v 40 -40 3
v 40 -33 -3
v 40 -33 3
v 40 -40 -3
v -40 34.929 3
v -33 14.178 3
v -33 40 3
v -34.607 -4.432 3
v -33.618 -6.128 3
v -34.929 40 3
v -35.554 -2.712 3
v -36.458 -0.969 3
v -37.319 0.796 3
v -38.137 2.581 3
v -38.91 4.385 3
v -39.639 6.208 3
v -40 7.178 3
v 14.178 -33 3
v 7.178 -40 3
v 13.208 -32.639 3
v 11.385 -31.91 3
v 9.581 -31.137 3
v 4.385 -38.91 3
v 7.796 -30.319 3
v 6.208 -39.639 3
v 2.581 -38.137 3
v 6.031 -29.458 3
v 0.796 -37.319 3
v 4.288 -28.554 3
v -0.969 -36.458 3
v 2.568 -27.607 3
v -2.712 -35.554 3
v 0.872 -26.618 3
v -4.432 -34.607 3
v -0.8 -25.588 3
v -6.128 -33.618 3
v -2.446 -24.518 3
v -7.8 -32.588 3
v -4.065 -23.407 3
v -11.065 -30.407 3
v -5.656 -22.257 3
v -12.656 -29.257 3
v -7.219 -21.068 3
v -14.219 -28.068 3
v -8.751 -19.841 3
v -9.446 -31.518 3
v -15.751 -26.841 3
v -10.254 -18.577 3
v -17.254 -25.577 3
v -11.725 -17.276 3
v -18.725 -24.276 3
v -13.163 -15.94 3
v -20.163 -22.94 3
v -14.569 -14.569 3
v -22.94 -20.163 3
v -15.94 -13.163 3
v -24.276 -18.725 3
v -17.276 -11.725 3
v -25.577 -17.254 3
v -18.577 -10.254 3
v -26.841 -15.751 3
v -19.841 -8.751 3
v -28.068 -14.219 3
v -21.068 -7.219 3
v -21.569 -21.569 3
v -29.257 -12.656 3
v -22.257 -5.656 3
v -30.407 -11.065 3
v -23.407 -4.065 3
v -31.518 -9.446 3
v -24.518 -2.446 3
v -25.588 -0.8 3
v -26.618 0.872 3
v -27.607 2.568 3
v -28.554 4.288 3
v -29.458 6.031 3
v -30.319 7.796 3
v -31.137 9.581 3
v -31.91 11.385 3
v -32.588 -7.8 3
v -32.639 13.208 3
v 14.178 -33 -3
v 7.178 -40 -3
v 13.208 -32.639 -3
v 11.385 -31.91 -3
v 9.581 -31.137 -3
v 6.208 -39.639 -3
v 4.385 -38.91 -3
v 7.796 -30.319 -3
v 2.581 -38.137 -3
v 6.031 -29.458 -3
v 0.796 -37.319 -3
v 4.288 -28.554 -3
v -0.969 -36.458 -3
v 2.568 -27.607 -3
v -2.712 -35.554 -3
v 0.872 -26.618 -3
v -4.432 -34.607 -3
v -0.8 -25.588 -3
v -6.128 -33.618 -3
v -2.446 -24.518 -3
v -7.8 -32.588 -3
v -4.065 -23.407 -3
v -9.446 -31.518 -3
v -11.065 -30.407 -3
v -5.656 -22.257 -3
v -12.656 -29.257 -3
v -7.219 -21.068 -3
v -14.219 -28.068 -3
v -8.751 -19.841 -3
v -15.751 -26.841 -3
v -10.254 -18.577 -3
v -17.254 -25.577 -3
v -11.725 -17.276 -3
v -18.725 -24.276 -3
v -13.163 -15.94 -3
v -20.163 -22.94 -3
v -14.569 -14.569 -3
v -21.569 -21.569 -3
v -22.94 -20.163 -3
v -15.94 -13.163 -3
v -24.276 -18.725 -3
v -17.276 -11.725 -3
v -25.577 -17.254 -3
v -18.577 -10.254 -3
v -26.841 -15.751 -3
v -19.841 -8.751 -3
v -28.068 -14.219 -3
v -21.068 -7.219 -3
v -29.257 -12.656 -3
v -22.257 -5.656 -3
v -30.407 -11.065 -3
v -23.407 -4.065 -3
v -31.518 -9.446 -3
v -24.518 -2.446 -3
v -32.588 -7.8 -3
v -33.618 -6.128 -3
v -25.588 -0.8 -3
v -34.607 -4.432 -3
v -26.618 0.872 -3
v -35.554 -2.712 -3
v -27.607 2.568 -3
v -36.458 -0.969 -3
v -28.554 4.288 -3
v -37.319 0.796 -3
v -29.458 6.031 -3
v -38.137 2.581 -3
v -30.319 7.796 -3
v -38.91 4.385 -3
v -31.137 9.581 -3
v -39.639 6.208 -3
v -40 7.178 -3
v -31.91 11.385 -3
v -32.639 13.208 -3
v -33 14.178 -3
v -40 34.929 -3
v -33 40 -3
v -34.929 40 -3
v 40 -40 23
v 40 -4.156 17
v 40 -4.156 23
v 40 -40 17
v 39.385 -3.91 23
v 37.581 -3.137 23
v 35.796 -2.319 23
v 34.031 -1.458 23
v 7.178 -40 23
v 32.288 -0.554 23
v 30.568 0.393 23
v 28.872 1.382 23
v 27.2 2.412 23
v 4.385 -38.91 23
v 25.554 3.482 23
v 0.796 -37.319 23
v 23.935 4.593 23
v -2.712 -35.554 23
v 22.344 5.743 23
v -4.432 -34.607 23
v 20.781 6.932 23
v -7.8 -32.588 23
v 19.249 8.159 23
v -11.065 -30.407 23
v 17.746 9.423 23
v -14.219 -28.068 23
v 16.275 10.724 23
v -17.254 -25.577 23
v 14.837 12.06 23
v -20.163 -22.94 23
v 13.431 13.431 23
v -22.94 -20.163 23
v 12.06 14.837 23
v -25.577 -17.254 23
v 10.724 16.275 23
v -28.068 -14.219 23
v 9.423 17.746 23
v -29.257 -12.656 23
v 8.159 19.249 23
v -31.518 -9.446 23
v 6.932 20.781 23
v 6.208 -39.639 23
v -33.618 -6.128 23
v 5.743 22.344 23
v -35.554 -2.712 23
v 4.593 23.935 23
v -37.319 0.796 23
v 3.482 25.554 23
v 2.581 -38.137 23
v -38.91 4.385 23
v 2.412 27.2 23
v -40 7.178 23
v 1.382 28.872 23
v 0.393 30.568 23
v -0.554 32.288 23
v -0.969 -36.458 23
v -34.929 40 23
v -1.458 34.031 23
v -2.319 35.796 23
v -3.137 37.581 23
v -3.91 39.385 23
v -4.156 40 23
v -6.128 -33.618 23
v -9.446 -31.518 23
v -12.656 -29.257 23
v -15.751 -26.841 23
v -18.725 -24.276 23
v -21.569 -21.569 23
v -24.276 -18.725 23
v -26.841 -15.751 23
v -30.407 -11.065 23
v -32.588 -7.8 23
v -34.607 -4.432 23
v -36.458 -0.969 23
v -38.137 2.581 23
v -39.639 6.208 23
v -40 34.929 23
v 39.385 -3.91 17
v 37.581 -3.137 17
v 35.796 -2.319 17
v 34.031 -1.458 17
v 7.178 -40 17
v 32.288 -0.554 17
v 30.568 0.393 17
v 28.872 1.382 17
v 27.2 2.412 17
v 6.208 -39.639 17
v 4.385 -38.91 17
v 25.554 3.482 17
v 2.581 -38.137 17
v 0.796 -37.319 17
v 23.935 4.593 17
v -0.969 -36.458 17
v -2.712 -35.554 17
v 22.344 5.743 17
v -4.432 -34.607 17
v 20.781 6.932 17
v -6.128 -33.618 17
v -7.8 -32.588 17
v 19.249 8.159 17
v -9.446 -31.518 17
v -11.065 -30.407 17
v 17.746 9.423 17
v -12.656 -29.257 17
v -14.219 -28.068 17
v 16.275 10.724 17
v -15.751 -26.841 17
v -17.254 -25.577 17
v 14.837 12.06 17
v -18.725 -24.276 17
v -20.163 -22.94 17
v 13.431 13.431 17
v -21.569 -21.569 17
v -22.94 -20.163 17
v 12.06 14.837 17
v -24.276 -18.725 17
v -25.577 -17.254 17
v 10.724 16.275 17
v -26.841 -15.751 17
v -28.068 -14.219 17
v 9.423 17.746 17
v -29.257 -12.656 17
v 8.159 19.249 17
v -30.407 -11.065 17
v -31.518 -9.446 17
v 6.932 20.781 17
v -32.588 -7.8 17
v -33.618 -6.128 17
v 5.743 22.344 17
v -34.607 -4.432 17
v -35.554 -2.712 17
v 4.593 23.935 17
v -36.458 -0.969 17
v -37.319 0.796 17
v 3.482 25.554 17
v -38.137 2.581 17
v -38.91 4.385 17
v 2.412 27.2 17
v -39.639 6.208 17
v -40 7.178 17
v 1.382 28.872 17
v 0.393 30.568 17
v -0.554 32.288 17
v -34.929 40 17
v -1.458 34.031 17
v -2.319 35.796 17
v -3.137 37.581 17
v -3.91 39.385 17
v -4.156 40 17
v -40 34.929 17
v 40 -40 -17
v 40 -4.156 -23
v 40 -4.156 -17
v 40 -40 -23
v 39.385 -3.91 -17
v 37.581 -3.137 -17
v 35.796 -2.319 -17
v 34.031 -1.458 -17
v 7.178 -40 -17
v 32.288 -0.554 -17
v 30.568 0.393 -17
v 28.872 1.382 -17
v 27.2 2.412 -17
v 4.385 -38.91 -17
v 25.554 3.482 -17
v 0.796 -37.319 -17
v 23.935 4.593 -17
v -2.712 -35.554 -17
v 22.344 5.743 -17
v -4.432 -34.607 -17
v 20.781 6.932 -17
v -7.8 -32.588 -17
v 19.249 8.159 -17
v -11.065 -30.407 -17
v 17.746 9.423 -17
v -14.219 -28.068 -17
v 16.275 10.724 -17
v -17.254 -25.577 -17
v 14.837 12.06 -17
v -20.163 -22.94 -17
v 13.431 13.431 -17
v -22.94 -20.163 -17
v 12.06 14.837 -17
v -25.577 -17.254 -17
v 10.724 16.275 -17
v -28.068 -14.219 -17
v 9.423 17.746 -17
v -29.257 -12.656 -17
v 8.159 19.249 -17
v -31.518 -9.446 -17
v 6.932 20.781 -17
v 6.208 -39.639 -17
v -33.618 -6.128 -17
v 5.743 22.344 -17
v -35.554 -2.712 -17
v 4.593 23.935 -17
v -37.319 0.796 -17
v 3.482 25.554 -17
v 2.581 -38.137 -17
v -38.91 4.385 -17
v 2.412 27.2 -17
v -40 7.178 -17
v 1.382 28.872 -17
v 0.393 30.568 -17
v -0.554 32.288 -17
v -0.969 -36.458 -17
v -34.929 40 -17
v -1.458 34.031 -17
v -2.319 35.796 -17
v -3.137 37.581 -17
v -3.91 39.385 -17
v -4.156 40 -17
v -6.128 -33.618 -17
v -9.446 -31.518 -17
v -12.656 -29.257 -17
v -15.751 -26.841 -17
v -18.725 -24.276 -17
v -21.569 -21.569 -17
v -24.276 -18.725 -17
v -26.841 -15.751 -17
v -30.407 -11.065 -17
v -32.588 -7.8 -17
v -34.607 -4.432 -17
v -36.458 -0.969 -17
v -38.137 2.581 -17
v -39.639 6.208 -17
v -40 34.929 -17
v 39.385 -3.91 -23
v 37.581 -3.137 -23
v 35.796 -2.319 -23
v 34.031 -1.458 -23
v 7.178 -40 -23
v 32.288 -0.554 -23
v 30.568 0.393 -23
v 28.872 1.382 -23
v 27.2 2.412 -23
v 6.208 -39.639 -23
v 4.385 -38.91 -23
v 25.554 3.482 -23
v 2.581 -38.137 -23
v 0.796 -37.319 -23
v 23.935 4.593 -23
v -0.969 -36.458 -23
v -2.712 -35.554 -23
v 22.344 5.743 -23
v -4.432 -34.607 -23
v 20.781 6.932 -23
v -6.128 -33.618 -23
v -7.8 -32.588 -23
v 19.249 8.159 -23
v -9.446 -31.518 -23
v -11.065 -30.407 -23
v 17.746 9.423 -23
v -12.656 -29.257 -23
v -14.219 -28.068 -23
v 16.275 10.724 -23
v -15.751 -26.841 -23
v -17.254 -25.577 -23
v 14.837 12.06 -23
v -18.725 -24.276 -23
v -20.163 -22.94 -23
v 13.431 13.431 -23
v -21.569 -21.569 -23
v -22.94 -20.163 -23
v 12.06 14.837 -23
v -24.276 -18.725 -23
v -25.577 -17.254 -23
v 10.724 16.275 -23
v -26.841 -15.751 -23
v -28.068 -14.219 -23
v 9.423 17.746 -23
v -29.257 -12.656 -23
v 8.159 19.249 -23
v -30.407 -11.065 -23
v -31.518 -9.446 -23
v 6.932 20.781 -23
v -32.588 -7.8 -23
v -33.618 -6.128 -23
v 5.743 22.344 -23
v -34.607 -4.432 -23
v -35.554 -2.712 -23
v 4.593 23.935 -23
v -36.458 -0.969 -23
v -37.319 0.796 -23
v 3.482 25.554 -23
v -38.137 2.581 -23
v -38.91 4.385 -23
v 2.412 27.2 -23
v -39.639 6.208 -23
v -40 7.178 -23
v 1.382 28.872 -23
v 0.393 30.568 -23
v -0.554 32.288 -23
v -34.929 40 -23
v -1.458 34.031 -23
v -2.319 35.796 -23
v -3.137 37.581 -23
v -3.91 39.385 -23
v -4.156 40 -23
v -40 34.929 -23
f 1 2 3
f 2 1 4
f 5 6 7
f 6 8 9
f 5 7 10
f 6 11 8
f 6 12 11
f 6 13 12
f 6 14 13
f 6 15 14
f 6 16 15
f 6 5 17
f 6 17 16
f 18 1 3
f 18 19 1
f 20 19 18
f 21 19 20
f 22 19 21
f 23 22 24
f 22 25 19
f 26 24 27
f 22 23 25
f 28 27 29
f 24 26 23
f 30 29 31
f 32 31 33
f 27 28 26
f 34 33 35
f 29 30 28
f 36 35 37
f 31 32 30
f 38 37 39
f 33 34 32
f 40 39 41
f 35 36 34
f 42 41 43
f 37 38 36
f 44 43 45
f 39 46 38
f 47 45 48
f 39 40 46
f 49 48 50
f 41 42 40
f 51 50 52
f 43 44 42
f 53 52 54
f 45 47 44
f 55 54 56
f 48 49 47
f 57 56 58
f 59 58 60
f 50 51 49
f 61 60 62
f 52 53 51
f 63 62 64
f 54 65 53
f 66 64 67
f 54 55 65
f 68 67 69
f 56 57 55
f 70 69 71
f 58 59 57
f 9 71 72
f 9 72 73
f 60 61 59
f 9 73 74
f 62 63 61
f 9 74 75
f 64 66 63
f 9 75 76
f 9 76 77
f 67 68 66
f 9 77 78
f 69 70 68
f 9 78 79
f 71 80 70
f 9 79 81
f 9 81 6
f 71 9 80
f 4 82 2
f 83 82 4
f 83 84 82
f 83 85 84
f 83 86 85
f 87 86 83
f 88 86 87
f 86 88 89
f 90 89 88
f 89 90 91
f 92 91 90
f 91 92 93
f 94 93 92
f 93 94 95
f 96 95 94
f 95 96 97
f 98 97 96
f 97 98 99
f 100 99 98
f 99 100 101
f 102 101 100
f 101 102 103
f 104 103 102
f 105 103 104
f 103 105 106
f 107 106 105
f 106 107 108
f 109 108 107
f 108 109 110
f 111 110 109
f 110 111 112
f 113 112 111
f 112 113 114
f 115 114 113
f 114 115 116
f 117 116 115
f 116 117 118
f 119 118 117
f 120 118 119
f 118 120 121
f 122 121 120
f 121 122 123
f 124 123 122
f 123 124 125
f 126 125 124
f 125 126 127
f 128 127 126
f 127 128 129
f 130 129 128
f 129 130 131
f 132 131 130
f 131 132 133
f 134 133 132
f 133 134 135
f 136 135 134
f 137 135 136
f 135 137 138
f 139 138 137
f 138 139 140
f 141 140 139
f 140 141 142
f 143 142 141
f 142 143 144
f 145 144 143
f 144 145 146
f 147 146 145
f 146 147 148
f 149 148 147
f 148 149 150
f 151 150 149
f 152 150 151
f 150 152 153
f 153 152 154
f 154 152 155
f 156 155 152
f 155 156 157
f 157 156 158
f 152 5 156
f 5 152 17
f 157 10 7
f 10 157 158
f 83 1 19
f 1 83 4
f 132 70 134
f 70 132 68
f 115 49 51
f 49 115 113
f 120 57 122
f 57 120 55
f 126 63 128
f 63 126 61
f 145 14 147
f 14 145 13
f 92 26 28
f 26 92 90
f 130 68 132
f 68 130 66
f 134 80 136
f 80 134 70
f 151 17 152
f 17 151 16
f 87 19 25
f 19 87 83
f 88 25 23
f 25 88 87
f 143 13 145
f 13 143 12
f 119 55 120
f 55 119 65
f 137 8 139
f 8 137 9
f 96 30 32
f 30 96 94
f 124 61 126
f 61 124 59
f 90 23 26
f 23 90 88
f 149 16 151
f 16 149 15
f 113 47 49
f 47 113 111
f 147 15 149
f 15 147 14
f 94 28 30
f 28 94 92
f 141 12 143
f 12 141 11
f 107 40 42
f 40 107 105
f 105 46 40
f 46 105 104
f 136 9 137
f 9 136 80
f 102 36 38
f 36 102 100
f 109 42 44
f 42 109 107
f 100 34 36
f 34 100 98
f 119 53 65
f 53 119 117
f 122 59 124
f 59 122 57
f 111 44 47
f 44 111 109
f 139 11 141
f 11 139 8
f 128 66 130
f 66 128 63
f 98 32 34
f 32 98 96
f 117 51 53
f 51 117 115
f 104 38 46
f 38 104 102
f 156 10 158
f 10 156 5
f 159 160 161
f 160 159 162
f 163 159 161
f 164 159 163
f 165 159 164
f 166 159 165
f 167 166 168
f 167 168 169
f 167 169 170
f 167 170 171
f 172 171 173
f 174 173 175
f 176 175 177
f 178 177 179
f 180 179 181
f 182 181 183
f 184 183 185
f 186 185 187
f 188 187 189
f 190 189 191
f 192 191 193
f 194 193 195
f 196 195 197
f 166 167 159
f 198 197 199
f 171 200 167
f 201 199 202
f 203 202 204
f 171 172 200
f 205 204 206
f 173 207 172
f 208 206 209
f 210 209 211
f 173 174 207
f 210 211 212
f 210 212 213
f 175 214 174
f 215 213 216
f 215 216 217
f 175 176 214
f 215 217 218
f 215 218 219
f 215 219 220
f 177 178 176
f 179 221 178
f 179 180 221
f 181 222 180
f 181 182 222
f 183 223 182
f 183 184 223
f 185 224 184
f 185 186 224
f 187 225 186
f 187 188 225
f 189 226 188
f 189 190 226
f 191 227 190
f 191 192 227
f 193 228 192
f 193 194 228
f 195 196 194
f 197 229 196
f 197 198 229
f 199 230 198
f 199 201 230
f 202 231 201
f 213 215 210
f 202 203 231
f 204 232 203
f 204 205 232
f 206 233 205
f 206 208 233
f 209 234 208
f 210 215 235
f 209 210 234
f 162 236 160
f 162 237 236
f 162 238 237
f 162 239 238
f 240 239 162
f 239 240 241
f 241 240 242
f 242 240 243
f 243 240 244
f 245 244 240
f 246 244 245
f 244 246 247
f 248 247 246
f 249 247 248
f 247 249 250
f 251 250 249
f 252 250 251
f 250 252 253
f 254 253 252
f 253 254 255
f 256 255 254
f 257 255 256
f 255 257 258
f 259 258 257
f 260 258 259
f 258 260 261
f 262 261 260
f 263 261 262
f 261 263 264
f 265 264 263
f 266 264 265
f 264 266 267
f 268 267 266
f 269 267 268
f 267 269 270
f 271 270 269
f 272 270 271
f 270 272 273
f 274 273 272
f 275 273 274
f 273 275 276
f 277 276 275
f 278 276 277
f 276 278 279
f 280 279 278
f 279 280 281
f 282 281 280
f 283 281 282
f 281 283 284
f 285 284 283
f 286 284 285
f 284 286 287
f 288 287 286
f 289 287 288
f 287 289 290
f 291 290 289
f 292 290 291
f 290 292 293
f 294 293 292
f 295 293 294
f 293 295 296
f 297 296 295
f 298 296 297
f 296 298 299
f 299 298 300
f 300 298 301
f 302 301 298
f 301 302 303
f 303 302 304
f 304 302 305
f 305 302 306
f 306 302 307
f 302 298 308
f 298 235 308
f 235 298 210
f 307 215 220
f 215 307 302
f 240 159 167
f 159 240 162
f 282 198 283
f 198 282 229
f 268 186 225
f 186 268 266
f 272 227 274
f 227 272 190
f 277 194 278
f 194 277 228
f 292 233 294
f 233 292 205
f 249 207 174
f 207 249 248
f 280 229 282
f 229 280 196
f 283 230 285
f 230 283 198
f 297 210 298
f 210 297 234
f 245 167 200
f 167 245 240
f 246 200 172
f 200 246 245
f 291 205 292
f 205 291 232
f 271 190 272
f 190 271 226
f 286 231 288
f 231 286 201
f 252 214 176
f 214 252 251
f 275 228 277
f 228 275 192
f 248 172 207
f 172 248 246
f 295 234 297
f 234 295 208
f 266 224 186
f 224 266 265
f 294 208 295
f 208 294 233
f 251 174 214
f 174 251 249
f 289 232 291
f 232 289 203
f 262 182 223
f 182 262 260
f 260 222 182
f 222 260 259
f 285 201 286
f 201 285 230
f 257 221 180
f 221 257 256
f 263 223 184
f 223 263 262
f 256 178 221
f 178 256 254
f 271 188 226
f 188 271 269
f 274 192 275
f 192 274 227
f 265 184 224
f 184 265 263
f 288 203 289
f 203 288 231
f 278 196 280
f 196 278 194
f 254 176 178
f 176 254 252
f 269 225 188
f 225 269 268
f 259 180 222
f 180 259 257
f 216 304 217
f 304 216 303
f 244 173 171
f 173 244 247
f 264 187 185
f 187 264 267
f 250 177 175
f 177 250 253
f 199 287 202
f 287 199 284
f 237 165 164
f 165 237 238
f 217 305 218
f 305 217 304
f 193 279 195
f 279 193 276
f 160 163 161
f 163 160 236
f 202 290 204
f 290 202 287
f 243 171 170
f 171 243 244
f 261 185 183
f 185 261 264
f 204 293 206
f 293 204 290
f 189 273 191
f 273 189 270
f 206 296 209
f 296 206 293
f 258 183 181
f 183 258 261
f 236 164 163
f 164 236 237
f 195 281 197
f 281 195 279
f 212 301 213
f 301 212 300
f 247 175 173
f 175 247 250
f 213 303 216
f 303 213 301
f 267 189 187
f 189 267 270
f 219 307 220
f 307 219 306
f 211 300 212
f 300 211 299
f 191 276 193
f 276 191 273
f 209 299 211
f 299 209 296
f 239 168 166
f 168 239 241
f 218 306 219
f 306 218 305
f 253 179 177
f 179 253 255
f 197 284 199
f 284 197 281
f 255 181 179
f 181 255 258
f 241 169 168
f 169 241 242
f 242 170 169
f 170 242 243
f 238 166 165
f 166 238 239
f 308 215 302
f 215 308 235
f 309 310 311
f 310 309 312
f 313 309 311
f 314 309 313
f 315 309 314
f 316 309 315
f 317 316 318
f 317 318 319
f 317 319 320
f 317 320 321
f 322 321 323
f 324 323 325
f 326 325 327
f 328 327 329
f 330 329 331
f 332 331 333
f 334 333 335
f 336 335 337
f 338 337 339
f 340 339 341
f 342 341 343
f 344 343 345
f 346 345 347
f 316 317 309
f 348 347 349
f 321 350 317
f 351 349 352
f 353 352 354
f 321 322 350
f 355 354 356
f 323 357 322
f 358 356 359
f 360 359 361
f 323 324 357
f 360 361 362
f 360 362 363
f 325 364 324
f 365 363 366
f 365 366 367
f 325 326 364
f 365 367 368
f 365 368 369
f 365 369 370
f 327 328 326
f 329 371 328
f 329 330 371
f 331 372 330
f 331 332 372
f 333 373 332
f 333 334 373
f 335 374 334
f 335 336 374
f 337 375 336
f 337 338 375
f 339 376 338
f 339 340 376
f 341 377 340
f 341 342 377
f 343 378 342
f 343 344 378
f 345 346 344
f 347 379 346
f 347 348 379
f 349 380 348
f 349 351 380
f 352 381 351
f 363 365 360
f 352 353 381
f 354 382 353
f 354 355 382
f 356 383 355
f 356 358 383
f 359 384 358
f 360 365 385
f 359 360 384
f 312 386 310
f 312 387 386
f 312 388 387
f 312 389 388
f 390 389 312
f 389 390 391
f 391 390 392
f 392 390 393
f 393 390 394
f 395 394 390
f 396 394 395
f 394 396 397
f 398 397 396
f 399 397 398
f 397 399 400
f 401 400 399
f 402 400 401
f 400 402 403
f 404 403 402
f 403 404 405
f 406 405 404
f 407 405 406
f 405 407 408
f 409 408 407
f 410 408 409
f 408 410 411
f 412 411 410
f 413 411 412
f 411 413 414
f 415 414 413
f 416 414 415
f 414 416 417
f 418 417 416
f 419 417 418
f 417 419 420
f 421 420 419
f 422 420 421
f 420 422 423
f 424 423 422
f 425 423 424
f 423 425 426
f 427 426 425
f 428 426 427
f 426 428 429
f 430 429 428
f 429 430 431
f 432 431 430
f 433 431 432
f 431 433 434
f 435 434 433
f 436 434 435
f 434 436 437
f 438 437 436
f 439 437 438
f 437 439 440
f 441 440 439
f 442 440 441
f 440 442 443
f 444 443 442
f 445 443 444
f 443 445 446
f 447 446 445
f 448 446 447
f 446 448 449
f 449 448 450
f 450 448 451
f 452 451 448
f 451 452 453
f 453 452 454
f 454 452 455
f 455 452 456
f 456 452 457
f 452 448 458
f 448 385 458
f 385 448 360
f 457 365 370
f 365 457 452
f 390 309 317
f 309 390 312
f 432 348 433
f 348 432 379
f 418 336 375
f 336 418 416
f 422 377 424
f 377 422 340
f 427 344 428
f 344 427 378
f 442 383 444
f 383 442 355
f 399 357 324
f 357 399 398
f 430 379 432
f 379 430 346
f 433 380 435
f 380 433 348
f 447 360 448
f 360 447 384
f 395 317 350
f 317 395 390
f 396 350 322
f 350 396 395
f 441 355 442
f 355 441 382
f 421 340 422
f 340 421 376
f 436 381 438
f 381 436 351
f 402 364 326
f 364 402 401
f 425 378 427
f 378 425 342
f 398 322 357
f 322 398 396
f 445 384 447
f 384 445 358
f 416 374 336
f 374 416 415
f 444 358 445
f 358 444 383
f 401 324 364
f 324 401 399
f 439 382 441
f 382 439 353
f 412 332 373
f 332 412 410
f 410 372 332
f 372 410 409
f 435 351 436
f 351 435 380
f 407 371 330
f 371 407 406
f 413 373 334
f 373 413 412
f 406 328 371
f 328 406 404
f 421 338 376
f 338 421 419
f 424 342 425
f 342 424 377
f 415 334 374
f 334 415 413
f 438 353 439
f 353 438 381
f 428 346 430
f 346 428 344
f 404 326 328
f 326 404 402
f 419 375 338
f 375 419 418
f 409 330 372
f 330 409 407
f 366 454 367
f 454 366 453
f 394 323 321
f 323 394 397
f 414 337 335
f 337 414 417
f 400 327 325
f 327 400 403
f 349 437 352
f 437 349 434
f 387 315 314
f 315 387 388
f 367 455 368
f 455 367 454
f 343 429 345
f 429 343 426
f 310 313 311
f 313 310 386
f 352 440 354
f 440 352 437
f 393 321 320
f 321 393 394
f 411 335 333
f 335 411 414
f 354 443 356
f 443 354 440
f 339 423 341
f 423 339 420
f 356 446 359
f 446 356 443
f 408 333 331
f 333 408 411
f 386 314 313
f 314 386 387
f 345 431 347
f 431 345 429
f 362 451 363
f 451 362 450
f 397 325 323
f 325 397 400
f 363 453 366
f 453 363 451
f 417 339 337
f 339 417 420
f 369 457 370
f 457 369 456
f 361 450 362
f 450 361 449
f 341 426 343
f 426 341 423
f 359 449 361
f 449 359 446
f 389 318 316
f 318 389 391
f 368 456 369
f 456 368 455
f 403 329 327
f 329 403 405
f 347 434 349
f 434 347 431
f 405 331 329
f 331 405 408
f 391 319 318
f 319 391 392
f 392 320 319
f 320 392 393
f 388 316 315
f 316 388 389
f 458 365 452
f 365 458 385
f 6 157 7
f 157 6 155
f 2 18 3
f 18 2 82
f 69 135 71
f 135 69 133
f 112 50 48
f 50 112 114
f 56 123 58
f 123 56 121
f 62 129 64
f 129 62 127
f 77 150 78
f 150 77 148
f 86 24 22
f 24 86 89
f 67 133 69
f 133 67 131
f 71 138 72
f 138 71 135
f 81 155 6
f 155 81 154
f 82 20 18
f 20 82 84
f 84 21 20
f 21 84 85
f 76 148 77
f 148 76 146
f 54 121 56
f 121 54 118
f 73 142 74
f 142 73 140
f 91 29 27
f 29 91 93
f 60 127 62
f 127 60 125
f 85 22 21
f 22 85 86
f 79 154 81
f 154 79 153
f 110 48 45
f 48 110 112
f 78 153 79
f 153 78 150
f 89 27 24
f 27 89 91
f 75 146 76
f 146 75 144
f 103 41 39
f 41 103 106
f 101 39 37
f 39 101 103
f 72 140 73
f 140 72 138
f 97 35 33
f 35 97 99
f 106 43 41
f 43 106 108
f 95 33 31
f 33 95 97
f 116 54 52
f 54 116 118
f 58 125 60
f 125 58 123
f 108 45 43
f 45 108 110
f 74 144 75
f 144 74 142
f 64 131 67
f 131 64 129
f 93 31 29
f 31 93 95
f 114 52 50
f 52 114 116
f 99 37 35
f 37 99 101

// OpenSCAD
/*
 * File: marcel_shell_parts.scad
 *
 * Description:
 * Shell parts
 * head, base, middle
 * Author: R1D1
 *
 * Licence : CC-By-SA
 * */

//include <round_head.scad>

// ======================================
// Top shell Head from sphere and cut
module round_top(radius=50, hat_thickness=0.2)
{
    difference()
    {
        // Main round shape
        translate([0,0,-0.5*radius])
        {
            difference()
            {
                sphere(r=radius, $fn=100, center=true);
                //sphere(r=(1.0-hat_thickness)*radius, $fn=100, center=true);
            }
        }
        // cylinder was translated -0.15*radius on z
        translate([0.,0.,-0.8*radius]){ cylinder(r=1.05*radius, h=1.6*radius, center=true); }
    }
}

// ======================================
module round_bottom(radius=50, hat_thickness=0.2)
{
    points_head = [[0.,0.], [hat_thickness*radius, 0.], [hat_thickness*radius, -0.05*radius], [0., -0.1*radius], [-10*hat_thickness,-0.1*radius], [-10*hat_thickness,0.]]; 
    rotate_extrude(angle = 30, convexity = 10, $fn=200) 
    {
        translate([0.85*(1.-hat_thickness)*radius, 0, 0])
        {
            polygon(points=points_head);
        }
    }
}

// ======================================
// Full head
module head_top_shell(head_radius, head_thickness)
{
    difference()
    {
        scale([1.0,0.8,1.0])
        {
            difference()
            {
                round_top(head_radius, head_thickness);
                translate([0,0,-0.5*head_radius]){ #sphere(r=(1.0-head_thickness)*head_radius, $fn=100, center=true); }
            }
            round_bottom(head_radius, head_thickness);
        }
        
        // US positioning
        front_offset = 14;
        side_offset = -10;
        vert_offset = -13;
        // US sensor holes
       union()
        {
        rotate([0,30,0])
        {
            translate([16/2+1+vert_offset,18/2+1+side_offset,1.3+front_offset])
            { cylinder(r=8.5, h=50, center=true); }
            translate([16/2+27+1+vert_offset,18/2+1+side_offset,1.3+front_offset])
            { cylinder(r=8.5, h=50, center=true); }
            intersection()
            {
                translate([16/2+13.5+1+vert_offset,0,0])
                //{ cube([60,40,70], center=true); }
                scale([1.0,0.8,1.0])
                {
                }
            }
        }
        }
    }
}

//head_top_shell(60, 0.1);
// ======================================
// ======================================

// OUTSIDE SHELL
base_radius = 50;
base_height = 25;
mid_height = 75;
base_thickness = 5;
// base

// ======================================
// to clean and reorganize
module base_shell(radius, height, thickness)
{
    color([1.0, 1.0, 1.0])
    { 
        difference()
        {
            cylinder(r=radius, h=height, $fn=200, center=true);
            translate([0.,0., thickness]){ cylinder(r=radius-thickness, h=height, $fn=200, center=true); }
        }
    }
}

//base_shell();

//round_top(h_radius, h_thickness);
//round_bottom(h_radius, h_thickness);

// ======================================
// to clean and reorganize
base_radius = 50;
base_height = 25;
mid_height = 75;
base_thickness = 5;

module body_shell(resolution=100)
{
    // middle
    mid_factor = 0.7;
    intersection()
    {
        // Remove this translation here and then adapt B:
        //translate([0.,0.,base_height])
        translate([0., 0., 0.])
        {
                difference()
                {
                    difference()
                    {
                        color([1.0, 1.0, 1.0])
                        {
                           cylinder(r1=base_radius, r2=mid_factor*base_radius,  h=mid_height+1, $fn=resolution, center=false);
                        }
                        color([0.0, 1.0, 1.0])
                        {
                            translate([0.,0.,base_thickness]){
                            // inside void
                            cylinder(r1=base_radius-base_thickness, r2=mid_factor*(base_radius-base_thickness), h=mid_height, $fn=resolution, center=false);
                            }
                            translate([0.,0., -base_thickness]){
                                cylinder(r=(base_radius-base_thickness)-1, h=base_height+1, $fn=resolution, center=true);
                            }
                        }
                    }
                    //translate([30.,0.,mid_height]){ rotate([0,90,0]){ cylinder(r=25,h=30, $fn=200, center=true); } }
                }
        }
        // B translation needs to be adapted
        //translate([-0.65*base_radius,0.,mid_height*0.15])
        translate([-0.65*base_radius,0., -(25 - 0.15 * 75)])
        {
            rotate([90,0,0])
            {
                color([0.,0.,1.0, 0.2]){ cylinder(r=90,h=120, $fn=resolution, center=true); }
            }
        }
    }
}

//body_shell();

// ======================================
module leg(resolution=24)
{
  rotate([0,-90,0])
  {
    linear_extrude(height = 16, center = true)
    {
      intersection()
      {
        square(20,30);
        circle(r=23, $fn=resolution);
      }
    }
  }
}

//leg();

// ======================================
module hv_side(resolution=24)
{
    difference()
    {
    intersection()
    {
        cube([80,80,6], center=true);
        translate([35,35,0])
        {
            cylinder(r=80, h=10, center=true, $fn=resolution);
        }
    }
    translate([70,70,0]){ cylinder(r=80, h=10, center=true, $fn=resolution); }
    translate([-41,41,0]){ rotate([0,0,45]){ cube([15,10,10], center=true); } }
    }
}
module head_variant(resolution=24)
{
    color([1,0,0])
    {
        translate([0,0,20]){ hv_side(resolution); }
        translate([0,0,-20]){ hv_side(resolution); }
    }
    difference()
    {
        hv_side(resolution);
        translate([7,7,0]){ scale([1.0, 1.0, 1.1]) hv_side(resolution); }
    }
}

head_variant(resolution=256);
